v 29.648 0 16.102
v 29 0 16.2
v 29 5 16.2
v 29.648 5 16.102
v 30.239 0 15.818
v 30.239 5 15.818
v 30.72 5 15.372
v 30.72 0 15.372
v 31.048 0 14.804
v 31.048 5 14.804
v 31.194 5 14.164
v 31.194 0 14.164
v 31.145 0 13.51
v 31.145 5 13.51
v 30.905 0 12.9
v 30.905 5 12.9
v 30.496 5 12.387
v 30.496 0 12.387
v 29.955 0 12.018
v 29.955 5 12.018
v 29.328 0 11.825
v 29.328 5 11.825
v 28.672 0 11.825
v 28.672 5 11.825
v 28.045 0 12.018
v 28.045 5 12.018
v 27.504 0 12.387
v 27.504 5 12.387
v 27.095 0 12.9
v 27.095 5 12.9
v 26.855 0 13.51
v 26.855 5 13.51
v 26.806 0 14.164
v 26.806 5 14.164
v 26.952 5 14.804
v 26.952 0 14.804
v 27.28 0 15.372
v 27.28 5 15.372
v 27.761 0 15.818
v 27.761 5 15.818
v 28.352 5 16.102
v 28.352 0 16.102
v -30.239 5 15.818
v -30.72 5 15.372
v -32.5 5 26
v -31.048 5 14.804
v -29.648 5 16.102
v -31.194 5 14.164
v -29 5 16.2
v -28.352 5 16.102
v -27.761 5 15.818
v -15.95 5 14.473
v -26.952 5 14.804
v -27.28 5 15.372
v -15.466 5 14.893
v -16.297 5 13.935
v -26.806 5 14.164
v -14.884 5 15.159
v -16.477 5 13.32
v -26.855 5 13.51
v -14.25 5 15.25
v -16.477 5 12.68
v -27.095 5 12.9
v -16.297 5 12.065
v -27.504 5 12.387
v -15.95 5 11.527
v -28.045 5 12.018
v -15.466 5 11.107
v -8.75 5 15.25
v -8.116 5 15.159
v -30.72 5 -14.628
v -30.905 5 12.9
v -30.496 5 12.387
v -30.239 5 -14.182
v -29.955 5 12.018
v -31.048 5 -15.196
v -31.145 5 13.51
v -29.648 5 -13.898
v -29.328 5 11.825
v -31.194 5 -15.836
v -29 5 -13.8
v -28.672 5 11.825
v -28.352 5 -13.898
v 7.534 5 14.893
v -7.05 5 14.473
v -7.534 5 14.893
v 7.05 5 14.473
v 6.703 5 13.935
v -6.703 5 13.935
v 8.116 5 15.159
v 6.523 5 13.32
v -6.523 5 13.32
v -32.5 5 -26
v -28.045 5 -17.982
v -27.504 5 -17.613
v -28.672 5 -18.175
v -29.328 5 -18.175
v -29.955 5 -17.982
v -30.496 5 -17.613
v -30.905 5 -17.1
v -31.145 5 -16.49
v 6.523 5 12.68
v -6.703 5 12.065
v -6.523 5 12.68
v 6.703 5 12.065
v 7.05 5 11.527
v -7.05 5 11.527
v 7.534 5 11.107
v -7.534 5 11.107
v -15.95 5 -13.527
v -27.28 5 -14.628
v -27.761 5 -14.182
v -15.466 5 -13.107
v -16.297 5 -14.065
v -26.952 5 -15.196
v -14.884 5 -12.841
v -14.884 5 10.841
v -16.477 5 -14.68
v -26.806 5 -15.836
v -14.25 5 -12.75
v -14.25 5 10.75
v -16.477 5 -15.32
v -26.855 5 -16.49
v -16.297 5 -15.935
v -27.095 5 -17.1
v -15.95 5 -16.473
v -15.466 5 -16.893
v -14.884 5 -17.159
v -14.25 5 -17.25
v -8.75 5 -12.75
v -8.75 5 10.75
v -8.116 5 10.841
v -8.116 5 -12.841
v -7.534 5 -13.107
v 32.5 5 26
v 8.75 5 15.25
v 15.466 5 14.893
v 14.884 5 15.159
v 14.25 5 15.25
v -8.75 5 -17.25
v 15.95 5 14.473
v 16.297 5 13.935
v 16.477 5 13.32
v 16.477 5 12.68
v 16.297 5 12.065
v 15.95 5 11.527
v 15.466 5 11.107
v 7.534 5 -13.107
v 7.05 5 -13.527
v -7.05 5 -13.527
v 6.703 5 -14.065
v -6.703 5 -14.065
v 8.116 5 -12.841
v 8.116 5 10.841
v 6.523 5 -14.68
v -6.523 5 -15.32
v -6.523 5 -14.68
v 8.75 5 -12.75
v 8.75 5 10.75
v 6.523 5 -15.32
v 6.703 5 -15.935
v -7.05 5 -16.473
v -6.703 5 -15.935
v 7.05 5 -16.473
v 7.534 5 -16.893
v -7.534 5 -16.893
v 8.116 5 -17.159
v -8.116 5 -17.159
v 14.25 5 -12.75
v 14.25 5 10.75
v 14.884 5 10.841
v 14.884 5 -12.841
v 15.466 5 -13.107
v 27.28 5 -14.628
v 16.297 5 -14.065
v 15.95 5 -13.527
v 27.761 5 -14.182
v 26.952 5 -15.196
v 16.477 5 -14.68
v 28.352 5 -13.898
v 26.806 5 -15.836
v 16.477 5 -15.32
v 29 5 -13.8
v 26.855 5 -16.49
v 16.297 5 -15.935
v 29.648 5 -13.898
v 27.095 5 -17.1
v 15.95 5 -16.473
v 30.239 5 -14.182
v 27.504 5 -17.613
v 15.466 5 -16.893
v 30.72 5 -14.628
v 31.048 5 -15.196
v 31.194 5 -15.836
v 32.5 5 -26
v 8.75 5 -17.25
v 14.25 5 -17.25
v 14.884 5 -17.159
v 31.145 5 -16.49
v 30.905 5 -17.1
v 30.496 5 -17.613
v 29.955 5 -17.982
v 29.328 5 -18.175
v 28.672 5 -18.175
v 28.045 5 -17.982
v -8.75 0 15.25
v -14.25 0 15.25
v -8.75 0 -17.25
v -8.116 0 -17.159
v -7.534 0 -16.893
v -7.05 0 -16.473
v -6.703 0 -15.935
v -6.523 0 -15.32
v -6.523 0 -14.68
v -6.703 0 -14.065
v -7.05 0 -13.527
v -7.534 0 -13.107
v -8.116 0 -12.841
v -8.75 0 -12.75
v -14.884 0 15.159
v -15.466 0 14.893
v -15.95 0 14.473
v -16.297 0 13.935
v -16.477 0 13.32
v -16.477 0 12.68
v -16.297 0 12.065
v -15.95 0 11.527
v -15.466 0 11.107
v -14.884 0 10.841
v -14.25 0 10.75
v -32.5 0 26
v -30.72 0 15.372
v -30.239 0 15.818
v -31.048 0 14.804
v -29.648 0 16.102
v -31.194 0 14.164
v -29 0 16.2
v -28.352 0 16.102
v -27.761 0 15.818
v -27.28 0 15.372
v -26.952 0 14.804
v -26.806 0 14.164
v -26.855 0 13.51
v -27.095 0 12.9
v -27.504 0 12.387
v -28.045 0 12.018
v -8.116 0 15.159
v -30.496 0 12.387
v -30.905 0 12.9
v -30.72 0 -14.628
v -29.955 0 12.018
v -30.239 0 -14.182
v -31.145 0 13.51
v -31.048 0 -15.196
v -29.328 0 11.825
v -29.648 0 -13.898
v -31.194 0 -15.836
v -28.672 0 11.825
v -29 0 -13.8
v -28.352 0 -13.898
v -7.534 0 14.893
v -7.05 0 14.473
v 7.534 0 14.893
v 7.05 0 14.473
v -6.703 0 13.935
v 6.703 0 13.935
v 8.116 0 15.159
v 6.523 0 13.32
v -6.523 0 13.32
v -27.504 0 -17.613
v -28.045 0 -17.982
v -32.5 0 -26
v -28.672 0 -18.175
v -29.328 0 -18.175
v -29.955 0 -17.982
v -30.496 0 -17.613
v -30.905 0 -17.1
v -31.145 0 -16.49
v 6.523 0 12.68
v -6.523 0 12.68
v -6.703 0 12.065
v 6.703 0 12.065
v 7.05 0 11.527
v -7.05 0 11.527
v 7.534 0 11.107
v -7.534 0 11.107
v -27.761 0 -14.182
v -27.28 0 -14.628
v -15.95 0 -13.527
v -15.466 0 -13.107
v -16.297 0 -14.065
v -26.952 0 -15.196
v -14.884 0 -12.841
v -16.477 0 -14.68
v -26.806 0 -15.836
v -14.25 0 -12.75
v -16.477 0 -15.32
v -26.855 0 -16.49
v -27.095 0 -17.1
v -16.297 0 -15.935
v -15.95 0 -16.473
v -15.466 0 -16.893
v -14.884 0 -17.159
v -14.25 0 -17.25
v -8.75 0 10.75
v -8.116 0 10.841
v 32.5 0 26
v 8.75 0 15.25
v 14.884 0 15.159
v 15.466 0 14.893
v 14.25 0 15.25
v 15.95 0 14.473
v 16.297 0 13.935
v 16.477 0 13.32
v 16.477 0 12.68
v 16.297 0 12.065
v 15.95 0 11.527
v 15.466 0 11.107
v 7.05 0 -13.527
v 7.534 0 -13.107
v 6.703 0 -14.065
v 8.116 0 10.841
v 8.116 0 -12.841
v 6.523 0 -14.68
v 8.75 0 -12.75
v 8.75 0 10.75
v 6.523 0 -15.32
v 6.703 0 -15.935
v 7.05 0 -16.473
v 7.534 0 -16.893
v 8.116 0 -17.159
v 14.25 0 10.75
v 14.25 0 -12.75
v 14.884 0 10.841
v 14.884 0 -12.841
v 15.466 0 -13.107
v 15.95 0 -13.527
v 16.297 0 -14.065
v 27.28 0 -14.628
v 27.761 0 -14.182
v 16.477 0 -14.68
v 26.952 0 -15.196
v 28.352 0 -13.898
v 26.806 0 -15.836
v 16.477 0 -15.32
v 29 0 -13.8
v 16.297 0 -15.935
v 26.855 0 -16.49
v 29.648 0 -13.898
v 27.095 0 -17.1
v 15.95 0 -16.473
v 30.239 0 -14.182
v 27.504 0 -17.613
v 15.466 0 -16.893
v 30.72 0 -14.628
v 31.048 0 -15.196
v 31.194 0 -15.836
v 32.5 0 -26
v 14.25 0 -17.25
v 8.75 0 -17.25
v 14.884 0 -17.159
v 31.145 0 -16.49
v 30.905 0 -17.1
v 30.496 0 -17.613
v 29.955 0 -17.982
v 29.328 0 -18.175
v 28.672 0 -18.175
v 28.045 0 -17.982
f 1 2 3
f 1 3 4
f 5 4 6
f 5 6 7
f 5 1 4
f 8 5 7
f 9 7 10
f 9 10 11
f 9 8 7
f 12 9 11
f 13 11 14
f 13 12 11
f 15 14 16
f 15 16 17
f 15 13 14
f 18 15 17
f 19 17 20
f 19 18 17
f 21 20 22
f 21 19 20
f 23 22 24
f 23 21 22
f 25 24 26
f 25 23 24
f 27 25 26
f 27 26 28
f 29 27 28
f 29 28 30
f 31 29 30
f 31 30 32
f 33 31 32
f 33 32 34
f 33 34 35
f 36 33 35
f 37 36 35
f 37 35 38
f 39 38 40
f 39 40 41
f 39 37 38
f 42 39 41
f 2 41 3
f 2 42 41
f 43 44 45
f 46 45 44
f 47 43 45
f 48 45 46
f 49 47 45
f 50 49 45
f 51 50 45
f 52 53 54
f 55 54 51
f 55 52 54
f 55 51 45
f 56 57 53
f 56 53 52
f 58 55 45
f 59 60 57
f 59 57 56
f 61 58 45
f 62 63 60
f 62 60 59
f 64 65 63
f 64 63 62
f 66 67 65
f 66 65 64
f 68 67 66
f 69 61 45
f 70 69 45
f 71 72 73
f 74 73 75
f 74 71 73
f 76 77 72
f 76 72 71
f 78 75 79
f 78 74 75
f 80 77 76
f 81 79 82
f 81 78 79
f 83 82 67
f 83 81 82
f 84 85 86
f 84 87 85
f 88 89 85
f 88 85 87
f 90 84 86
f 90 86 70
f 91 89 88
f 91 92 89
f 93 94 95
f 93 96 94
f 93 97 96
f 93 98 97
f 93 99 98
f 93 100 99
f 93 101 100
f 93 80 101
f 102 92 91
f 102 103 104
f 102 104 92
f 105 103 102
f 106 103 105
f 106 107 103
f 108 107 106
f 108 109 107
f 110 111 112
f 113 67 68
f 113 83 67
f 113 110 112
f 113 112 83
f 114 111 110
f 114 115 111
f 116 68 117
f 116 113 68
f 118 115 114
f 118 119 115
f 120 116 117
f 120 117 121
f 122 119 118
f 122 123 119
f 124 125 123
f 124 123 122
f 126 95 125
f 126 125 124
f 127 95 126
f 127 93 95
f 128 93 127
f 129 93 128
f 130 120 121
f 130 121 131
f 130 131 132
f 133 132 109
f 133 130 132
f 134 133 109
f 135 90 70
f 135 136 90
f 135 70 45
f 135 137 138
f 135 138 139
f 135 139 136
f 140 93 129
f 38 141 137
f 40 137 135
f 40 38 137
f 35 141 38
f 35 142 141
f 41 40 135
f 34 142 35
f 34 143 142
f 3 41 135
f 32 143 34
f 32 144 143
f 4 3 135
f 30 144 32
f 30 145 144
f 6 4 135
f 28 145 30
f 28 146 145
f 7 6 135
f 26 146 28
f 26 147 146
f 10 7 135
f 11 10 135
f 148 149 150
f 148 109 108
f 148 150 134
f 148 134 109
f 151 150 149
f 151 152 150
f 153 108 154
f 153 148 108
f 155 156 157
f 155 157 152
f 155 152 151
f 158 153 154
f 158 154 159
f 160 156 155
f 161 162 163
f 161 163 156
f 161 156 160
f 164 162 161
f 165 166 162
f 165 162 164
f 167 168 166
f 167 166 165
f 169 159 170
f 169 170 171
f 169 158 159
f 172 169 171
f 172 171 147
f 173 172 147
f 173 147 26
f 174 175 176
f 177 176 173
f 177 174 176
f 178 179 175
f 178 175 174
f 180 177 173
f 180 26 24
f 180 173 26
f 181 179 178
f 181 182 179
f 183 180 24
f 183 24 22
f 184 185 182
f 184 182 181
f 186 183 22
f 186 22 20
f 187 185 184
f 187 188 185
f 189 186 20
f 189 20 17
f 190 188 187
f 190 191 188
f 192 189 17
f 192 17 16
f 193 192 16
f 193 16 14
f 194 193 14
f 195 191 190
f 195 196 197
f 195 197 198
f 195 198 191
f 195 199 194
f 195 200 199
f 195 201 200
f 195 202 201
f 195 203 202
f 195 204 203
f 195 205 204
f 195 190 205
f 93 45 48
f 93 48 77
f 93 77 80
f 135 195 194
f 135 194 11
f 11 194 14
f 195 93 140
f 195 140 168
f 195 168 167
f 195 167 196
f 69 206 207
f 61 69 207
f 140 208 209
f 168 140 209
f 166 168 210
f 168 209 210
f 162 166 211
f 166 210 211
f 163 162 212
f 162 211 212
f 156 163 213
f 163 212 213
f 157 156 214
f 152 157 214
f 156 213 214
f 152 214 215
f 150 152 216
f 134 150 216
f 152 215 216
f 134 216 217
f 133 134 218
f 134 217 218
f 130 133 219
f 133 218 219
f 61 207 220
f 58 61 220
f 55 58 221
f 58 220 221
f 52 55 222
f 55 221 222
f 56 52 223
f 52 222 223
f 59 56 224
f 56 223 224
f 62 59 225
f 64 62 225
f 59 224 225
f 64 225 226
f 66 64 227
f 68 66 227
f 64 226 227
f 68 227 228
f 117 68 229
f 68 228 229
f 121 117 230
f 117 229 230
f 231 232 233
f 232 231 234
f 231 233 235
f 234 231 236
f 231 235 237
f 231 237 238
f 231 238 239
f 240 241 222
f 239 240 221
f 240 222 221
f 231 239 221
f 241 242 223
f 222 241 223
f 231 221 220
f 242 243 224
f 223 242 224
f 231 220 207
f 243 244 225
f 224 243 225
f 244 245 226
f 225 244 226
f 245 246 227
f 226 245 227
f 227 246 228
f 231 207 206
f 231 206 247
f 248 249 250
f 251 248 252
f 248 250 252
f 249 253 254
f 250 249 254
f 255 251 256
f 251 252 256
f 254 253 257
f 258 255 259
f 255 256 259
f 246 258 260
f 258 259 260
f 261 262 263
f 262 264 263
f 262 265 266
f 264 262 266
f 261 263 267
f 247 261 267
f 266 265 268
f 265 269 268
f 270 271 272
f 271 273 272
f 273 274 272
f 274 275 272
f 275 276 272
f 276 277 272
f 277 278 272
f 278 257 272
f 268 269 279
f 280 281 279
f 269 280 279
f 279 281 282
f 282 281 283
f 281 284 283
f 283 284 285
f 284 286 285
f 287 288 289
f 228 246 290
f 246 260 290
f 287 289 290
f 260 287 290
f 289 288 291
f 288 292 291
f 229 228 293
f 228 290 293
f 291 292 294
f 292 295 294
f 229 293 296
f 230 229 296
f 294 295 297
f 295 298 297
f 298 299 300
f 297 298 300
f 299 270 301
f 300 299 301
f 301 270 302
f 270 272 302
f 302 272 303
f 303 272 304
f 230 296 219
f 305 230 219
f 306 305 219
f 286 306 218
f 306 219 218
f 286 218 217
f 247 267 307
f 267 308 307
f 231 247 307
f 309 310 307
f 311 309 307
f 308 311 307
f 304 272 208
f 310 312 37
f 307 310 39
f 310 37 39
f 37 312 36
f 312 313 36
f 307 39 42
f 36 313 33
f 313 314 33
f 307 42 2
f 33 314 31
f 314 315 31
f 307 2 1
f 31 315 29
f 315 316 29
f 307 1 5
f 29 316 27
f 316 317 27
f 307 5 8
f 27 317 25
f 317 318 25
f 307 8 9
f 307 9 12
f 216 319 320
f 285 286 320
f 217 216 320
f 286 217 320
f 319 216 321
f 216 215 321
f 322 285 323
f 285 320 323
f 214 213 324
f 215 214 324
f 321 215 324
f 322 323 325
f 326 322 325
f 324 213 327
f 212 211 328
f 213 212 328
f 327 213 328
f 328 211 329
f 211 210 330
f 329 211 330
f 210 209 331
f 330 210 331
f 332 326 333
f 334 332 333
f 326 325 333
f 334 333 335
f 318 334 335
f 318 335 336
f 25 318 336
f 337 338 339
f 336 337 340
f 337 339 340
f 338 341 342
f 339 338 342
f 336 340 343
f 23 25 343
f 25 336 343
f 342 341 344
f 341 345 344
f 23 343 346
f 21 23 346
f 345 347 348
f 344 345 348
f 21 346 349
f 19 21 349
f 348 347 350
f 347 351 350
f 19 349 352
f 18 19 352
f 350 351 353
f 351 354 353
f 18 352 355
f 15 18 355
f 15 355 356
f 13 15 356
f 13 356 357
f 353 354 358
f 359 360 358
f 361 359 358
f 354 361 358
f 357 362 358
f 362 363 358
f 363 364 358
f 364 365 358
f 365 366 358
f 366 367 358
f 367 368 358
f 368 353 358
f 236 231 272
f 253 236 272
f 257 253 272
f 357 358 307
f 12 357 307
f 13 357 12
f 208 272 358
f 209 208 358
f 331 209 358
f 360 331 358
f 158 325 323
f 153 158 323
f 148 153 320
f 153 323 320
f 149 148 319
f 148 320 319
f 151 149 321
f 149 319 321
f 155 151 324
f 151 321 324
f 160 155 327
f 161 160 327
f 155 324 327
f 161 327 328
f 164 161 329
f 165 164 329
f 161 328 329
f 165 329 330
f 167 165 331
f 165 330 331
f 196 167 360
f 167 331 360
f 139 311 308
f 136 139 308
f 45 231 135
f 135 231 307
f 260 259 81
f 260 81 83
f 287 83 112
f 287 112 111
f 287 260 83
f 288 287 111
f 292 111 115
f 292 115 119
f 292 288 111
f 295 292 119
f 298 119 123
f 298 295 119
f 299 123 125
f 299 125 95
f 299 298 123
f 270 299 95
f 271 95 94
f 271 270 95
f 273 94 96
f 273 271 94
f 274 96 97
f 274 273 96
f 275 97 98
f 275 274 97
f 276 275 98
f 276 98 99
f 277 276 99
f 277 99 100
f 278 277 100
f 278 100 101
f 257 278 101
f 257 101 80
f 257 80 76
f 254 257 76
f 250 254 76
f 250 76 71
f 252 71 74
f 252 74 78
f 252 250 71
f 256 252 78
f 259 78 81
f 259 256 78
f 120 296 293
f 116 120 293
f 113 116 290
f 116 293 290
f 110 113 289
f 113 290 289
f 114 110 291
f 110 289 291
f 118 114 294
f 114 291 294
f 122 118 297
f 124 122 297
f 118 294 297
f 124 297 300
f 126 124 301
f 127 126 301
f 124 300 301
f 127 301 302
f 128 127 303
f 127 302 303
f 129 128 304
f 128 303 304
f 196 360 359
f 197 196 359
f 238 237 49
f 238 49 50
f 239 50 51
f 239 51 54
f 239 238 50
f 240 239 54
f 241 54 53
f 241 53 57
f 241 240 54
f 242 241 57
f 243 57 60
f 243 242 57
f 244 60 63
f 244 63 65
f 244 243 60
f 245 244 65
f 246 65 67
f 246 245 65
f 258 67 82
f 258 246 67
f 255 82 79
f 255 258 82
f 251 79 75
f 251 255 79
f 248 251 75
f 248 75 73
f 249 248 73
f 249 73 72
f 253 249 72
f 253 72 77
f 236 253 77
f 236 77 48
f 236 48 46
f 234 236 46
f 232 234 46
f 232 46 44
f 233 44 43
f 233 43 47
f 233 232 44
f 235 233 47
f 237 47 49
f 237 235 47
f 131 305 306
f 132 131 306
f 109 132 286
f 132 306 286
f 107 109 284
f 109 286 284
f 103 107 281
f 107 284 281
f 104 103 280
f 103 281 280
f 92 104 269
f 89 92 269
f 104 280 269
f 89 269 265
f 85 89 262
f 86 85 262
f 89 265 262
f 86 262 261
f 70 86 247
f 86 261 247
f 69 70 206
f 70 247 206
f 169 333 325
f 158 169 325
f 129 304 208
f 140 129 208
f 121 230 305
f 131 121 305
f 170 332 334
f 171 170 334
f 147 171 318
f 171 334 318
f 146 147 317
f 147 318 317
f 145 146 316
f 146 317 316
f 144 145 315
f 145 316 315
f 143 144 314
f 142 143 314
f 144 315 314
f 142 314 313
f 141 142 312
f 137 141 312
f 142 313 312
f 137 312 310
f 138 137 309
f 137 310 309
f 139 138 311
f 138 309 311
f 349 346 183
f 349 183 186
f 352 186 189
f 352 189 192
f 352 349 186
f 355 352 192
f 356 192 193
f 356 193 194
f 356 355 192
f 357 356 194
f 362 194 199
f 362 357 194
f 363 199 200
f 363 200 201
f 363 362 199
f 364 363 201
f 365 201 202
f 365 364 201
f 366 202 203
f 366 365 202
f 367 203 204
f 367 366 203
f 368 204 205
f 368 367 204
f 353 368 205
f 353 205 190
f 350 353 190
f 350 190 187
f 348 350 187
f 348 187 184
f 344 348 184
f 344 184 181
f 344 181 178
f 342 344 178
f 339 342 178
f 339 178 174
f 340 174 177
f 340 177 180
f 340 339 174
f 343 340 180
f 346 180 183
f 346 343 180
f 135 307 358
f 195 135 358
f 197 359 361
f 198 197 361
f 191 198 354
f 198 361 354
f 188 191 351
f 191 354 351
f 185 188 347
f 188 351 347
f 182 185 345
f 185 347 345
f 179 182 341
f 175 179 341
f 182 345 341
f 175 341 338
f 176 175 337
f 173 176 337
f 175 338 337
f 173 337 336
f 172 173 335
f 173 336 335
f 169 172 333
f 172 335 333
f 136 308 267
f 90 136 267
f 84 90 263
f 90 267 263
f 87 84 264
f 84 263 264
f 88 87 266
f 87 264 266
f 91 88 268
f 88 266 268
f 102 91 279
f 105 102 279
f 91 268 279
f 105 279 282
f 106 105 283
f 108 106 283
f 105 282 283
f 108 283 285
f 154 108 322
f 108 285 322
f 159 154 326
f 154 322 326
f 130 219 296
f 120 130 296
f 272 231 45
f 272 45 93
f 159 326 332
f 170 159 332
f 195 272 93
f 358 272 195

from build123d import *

# Parameters (mm, degrees)
SKIZZE1_W                       = 65
SKIZZE1_H                       = 52
SKIZZE1_R                       = 2.2
AUFSATZ_LINEAR_AUSTRAGEN1_DEPTH = 5


with BuildPart() as part:
    # Skizze1 → Aufsatz-Linear austragen1 (new body)
    with BuildSketch(Plane(origin=(0, 0, 0), x_dir=(1, 0, 0), z_dir=(0, 1, 0))):
        Rectangle(SKIZZE1_W, SKIZZE1_H)
        with Locations(Location((-29, 16, 0), (0, 0, 270))):
            Circle(SKIZZE1_R, mode=Mode.SUBTRACT)
        with Locations(Location((-29, -14, 0), (0, 0, 270))):
            Circle(SKIZZE1_R, mode=Mode.SUBTRACT)
        with Locations(Location((29, -14, 0), (0, 0, 270))):
            Circle(SKIZZE1_R, mode=Mode.SUBTRACT)
        with Locations(Location((29, 16, 0), (0, 0, 270))):
            Circle(SKIZZE1_R, mode=Mode.SUBTRACT)
        with BuildLine():
            Line((-14.25, 17.25), (-8.75, 17.25))
            ThreePointArc((-8.75, 17.25), (-6.5, 15), (-8.75, 12.75))
            Line((-8.75, 12.75), (-14.25, 12.75))
            ThreePointArc((-14.25, 12.75), (-16.5, 15), (-14.25, 17.25))
        make_face(mode=Mode.SUBTRACT)
        with BuildLine():
            Line((8.75, 17.25), (14.25, 17.25))
            ThreePointArc((14.25, 17.25), (16.5, 15), (14.25, 12.75))
            Line((14.25, 12.75), (8.75, 12.75))
            ThreePointArc((8.75, 12.75), (6.5, 15), (8.75, 17.25))
        make_face(mode=Mode.SUBTRACT)
        with BuildLine():
            Line((-14.25, -10.75), (-8.75, -10.75))
            ThreePointArc((-8.75, -10.75), (-6.5, -13), (-8.75, -15.25))
            Line((-8.75, -15.25), (-14.25, -15.25))
            ThreePointArc((-14.25, -15.25), (-16.5, -13), (-14.25, -10.75))
        make_face(mode=Mode.SUBTRACT)
        with BuildLine():
            Line((8.75, -10.75), (14.25, -10.75))
            ThreePointArc((14.25, -10.75), (16.5, -13), (14.25, -15.25))
            Line((14.25, -15.25), (8.75, -15.25))
            ThreePointArc((8.75, -15.25), (6.5, -13), (8.75, -10.75))
        make_face(mode=Mode.SUBTRACT)
    extrude(amount=AUFSATZ_LINEAR_AUSTRAGEN1_DEPTH)


solid = part.part
